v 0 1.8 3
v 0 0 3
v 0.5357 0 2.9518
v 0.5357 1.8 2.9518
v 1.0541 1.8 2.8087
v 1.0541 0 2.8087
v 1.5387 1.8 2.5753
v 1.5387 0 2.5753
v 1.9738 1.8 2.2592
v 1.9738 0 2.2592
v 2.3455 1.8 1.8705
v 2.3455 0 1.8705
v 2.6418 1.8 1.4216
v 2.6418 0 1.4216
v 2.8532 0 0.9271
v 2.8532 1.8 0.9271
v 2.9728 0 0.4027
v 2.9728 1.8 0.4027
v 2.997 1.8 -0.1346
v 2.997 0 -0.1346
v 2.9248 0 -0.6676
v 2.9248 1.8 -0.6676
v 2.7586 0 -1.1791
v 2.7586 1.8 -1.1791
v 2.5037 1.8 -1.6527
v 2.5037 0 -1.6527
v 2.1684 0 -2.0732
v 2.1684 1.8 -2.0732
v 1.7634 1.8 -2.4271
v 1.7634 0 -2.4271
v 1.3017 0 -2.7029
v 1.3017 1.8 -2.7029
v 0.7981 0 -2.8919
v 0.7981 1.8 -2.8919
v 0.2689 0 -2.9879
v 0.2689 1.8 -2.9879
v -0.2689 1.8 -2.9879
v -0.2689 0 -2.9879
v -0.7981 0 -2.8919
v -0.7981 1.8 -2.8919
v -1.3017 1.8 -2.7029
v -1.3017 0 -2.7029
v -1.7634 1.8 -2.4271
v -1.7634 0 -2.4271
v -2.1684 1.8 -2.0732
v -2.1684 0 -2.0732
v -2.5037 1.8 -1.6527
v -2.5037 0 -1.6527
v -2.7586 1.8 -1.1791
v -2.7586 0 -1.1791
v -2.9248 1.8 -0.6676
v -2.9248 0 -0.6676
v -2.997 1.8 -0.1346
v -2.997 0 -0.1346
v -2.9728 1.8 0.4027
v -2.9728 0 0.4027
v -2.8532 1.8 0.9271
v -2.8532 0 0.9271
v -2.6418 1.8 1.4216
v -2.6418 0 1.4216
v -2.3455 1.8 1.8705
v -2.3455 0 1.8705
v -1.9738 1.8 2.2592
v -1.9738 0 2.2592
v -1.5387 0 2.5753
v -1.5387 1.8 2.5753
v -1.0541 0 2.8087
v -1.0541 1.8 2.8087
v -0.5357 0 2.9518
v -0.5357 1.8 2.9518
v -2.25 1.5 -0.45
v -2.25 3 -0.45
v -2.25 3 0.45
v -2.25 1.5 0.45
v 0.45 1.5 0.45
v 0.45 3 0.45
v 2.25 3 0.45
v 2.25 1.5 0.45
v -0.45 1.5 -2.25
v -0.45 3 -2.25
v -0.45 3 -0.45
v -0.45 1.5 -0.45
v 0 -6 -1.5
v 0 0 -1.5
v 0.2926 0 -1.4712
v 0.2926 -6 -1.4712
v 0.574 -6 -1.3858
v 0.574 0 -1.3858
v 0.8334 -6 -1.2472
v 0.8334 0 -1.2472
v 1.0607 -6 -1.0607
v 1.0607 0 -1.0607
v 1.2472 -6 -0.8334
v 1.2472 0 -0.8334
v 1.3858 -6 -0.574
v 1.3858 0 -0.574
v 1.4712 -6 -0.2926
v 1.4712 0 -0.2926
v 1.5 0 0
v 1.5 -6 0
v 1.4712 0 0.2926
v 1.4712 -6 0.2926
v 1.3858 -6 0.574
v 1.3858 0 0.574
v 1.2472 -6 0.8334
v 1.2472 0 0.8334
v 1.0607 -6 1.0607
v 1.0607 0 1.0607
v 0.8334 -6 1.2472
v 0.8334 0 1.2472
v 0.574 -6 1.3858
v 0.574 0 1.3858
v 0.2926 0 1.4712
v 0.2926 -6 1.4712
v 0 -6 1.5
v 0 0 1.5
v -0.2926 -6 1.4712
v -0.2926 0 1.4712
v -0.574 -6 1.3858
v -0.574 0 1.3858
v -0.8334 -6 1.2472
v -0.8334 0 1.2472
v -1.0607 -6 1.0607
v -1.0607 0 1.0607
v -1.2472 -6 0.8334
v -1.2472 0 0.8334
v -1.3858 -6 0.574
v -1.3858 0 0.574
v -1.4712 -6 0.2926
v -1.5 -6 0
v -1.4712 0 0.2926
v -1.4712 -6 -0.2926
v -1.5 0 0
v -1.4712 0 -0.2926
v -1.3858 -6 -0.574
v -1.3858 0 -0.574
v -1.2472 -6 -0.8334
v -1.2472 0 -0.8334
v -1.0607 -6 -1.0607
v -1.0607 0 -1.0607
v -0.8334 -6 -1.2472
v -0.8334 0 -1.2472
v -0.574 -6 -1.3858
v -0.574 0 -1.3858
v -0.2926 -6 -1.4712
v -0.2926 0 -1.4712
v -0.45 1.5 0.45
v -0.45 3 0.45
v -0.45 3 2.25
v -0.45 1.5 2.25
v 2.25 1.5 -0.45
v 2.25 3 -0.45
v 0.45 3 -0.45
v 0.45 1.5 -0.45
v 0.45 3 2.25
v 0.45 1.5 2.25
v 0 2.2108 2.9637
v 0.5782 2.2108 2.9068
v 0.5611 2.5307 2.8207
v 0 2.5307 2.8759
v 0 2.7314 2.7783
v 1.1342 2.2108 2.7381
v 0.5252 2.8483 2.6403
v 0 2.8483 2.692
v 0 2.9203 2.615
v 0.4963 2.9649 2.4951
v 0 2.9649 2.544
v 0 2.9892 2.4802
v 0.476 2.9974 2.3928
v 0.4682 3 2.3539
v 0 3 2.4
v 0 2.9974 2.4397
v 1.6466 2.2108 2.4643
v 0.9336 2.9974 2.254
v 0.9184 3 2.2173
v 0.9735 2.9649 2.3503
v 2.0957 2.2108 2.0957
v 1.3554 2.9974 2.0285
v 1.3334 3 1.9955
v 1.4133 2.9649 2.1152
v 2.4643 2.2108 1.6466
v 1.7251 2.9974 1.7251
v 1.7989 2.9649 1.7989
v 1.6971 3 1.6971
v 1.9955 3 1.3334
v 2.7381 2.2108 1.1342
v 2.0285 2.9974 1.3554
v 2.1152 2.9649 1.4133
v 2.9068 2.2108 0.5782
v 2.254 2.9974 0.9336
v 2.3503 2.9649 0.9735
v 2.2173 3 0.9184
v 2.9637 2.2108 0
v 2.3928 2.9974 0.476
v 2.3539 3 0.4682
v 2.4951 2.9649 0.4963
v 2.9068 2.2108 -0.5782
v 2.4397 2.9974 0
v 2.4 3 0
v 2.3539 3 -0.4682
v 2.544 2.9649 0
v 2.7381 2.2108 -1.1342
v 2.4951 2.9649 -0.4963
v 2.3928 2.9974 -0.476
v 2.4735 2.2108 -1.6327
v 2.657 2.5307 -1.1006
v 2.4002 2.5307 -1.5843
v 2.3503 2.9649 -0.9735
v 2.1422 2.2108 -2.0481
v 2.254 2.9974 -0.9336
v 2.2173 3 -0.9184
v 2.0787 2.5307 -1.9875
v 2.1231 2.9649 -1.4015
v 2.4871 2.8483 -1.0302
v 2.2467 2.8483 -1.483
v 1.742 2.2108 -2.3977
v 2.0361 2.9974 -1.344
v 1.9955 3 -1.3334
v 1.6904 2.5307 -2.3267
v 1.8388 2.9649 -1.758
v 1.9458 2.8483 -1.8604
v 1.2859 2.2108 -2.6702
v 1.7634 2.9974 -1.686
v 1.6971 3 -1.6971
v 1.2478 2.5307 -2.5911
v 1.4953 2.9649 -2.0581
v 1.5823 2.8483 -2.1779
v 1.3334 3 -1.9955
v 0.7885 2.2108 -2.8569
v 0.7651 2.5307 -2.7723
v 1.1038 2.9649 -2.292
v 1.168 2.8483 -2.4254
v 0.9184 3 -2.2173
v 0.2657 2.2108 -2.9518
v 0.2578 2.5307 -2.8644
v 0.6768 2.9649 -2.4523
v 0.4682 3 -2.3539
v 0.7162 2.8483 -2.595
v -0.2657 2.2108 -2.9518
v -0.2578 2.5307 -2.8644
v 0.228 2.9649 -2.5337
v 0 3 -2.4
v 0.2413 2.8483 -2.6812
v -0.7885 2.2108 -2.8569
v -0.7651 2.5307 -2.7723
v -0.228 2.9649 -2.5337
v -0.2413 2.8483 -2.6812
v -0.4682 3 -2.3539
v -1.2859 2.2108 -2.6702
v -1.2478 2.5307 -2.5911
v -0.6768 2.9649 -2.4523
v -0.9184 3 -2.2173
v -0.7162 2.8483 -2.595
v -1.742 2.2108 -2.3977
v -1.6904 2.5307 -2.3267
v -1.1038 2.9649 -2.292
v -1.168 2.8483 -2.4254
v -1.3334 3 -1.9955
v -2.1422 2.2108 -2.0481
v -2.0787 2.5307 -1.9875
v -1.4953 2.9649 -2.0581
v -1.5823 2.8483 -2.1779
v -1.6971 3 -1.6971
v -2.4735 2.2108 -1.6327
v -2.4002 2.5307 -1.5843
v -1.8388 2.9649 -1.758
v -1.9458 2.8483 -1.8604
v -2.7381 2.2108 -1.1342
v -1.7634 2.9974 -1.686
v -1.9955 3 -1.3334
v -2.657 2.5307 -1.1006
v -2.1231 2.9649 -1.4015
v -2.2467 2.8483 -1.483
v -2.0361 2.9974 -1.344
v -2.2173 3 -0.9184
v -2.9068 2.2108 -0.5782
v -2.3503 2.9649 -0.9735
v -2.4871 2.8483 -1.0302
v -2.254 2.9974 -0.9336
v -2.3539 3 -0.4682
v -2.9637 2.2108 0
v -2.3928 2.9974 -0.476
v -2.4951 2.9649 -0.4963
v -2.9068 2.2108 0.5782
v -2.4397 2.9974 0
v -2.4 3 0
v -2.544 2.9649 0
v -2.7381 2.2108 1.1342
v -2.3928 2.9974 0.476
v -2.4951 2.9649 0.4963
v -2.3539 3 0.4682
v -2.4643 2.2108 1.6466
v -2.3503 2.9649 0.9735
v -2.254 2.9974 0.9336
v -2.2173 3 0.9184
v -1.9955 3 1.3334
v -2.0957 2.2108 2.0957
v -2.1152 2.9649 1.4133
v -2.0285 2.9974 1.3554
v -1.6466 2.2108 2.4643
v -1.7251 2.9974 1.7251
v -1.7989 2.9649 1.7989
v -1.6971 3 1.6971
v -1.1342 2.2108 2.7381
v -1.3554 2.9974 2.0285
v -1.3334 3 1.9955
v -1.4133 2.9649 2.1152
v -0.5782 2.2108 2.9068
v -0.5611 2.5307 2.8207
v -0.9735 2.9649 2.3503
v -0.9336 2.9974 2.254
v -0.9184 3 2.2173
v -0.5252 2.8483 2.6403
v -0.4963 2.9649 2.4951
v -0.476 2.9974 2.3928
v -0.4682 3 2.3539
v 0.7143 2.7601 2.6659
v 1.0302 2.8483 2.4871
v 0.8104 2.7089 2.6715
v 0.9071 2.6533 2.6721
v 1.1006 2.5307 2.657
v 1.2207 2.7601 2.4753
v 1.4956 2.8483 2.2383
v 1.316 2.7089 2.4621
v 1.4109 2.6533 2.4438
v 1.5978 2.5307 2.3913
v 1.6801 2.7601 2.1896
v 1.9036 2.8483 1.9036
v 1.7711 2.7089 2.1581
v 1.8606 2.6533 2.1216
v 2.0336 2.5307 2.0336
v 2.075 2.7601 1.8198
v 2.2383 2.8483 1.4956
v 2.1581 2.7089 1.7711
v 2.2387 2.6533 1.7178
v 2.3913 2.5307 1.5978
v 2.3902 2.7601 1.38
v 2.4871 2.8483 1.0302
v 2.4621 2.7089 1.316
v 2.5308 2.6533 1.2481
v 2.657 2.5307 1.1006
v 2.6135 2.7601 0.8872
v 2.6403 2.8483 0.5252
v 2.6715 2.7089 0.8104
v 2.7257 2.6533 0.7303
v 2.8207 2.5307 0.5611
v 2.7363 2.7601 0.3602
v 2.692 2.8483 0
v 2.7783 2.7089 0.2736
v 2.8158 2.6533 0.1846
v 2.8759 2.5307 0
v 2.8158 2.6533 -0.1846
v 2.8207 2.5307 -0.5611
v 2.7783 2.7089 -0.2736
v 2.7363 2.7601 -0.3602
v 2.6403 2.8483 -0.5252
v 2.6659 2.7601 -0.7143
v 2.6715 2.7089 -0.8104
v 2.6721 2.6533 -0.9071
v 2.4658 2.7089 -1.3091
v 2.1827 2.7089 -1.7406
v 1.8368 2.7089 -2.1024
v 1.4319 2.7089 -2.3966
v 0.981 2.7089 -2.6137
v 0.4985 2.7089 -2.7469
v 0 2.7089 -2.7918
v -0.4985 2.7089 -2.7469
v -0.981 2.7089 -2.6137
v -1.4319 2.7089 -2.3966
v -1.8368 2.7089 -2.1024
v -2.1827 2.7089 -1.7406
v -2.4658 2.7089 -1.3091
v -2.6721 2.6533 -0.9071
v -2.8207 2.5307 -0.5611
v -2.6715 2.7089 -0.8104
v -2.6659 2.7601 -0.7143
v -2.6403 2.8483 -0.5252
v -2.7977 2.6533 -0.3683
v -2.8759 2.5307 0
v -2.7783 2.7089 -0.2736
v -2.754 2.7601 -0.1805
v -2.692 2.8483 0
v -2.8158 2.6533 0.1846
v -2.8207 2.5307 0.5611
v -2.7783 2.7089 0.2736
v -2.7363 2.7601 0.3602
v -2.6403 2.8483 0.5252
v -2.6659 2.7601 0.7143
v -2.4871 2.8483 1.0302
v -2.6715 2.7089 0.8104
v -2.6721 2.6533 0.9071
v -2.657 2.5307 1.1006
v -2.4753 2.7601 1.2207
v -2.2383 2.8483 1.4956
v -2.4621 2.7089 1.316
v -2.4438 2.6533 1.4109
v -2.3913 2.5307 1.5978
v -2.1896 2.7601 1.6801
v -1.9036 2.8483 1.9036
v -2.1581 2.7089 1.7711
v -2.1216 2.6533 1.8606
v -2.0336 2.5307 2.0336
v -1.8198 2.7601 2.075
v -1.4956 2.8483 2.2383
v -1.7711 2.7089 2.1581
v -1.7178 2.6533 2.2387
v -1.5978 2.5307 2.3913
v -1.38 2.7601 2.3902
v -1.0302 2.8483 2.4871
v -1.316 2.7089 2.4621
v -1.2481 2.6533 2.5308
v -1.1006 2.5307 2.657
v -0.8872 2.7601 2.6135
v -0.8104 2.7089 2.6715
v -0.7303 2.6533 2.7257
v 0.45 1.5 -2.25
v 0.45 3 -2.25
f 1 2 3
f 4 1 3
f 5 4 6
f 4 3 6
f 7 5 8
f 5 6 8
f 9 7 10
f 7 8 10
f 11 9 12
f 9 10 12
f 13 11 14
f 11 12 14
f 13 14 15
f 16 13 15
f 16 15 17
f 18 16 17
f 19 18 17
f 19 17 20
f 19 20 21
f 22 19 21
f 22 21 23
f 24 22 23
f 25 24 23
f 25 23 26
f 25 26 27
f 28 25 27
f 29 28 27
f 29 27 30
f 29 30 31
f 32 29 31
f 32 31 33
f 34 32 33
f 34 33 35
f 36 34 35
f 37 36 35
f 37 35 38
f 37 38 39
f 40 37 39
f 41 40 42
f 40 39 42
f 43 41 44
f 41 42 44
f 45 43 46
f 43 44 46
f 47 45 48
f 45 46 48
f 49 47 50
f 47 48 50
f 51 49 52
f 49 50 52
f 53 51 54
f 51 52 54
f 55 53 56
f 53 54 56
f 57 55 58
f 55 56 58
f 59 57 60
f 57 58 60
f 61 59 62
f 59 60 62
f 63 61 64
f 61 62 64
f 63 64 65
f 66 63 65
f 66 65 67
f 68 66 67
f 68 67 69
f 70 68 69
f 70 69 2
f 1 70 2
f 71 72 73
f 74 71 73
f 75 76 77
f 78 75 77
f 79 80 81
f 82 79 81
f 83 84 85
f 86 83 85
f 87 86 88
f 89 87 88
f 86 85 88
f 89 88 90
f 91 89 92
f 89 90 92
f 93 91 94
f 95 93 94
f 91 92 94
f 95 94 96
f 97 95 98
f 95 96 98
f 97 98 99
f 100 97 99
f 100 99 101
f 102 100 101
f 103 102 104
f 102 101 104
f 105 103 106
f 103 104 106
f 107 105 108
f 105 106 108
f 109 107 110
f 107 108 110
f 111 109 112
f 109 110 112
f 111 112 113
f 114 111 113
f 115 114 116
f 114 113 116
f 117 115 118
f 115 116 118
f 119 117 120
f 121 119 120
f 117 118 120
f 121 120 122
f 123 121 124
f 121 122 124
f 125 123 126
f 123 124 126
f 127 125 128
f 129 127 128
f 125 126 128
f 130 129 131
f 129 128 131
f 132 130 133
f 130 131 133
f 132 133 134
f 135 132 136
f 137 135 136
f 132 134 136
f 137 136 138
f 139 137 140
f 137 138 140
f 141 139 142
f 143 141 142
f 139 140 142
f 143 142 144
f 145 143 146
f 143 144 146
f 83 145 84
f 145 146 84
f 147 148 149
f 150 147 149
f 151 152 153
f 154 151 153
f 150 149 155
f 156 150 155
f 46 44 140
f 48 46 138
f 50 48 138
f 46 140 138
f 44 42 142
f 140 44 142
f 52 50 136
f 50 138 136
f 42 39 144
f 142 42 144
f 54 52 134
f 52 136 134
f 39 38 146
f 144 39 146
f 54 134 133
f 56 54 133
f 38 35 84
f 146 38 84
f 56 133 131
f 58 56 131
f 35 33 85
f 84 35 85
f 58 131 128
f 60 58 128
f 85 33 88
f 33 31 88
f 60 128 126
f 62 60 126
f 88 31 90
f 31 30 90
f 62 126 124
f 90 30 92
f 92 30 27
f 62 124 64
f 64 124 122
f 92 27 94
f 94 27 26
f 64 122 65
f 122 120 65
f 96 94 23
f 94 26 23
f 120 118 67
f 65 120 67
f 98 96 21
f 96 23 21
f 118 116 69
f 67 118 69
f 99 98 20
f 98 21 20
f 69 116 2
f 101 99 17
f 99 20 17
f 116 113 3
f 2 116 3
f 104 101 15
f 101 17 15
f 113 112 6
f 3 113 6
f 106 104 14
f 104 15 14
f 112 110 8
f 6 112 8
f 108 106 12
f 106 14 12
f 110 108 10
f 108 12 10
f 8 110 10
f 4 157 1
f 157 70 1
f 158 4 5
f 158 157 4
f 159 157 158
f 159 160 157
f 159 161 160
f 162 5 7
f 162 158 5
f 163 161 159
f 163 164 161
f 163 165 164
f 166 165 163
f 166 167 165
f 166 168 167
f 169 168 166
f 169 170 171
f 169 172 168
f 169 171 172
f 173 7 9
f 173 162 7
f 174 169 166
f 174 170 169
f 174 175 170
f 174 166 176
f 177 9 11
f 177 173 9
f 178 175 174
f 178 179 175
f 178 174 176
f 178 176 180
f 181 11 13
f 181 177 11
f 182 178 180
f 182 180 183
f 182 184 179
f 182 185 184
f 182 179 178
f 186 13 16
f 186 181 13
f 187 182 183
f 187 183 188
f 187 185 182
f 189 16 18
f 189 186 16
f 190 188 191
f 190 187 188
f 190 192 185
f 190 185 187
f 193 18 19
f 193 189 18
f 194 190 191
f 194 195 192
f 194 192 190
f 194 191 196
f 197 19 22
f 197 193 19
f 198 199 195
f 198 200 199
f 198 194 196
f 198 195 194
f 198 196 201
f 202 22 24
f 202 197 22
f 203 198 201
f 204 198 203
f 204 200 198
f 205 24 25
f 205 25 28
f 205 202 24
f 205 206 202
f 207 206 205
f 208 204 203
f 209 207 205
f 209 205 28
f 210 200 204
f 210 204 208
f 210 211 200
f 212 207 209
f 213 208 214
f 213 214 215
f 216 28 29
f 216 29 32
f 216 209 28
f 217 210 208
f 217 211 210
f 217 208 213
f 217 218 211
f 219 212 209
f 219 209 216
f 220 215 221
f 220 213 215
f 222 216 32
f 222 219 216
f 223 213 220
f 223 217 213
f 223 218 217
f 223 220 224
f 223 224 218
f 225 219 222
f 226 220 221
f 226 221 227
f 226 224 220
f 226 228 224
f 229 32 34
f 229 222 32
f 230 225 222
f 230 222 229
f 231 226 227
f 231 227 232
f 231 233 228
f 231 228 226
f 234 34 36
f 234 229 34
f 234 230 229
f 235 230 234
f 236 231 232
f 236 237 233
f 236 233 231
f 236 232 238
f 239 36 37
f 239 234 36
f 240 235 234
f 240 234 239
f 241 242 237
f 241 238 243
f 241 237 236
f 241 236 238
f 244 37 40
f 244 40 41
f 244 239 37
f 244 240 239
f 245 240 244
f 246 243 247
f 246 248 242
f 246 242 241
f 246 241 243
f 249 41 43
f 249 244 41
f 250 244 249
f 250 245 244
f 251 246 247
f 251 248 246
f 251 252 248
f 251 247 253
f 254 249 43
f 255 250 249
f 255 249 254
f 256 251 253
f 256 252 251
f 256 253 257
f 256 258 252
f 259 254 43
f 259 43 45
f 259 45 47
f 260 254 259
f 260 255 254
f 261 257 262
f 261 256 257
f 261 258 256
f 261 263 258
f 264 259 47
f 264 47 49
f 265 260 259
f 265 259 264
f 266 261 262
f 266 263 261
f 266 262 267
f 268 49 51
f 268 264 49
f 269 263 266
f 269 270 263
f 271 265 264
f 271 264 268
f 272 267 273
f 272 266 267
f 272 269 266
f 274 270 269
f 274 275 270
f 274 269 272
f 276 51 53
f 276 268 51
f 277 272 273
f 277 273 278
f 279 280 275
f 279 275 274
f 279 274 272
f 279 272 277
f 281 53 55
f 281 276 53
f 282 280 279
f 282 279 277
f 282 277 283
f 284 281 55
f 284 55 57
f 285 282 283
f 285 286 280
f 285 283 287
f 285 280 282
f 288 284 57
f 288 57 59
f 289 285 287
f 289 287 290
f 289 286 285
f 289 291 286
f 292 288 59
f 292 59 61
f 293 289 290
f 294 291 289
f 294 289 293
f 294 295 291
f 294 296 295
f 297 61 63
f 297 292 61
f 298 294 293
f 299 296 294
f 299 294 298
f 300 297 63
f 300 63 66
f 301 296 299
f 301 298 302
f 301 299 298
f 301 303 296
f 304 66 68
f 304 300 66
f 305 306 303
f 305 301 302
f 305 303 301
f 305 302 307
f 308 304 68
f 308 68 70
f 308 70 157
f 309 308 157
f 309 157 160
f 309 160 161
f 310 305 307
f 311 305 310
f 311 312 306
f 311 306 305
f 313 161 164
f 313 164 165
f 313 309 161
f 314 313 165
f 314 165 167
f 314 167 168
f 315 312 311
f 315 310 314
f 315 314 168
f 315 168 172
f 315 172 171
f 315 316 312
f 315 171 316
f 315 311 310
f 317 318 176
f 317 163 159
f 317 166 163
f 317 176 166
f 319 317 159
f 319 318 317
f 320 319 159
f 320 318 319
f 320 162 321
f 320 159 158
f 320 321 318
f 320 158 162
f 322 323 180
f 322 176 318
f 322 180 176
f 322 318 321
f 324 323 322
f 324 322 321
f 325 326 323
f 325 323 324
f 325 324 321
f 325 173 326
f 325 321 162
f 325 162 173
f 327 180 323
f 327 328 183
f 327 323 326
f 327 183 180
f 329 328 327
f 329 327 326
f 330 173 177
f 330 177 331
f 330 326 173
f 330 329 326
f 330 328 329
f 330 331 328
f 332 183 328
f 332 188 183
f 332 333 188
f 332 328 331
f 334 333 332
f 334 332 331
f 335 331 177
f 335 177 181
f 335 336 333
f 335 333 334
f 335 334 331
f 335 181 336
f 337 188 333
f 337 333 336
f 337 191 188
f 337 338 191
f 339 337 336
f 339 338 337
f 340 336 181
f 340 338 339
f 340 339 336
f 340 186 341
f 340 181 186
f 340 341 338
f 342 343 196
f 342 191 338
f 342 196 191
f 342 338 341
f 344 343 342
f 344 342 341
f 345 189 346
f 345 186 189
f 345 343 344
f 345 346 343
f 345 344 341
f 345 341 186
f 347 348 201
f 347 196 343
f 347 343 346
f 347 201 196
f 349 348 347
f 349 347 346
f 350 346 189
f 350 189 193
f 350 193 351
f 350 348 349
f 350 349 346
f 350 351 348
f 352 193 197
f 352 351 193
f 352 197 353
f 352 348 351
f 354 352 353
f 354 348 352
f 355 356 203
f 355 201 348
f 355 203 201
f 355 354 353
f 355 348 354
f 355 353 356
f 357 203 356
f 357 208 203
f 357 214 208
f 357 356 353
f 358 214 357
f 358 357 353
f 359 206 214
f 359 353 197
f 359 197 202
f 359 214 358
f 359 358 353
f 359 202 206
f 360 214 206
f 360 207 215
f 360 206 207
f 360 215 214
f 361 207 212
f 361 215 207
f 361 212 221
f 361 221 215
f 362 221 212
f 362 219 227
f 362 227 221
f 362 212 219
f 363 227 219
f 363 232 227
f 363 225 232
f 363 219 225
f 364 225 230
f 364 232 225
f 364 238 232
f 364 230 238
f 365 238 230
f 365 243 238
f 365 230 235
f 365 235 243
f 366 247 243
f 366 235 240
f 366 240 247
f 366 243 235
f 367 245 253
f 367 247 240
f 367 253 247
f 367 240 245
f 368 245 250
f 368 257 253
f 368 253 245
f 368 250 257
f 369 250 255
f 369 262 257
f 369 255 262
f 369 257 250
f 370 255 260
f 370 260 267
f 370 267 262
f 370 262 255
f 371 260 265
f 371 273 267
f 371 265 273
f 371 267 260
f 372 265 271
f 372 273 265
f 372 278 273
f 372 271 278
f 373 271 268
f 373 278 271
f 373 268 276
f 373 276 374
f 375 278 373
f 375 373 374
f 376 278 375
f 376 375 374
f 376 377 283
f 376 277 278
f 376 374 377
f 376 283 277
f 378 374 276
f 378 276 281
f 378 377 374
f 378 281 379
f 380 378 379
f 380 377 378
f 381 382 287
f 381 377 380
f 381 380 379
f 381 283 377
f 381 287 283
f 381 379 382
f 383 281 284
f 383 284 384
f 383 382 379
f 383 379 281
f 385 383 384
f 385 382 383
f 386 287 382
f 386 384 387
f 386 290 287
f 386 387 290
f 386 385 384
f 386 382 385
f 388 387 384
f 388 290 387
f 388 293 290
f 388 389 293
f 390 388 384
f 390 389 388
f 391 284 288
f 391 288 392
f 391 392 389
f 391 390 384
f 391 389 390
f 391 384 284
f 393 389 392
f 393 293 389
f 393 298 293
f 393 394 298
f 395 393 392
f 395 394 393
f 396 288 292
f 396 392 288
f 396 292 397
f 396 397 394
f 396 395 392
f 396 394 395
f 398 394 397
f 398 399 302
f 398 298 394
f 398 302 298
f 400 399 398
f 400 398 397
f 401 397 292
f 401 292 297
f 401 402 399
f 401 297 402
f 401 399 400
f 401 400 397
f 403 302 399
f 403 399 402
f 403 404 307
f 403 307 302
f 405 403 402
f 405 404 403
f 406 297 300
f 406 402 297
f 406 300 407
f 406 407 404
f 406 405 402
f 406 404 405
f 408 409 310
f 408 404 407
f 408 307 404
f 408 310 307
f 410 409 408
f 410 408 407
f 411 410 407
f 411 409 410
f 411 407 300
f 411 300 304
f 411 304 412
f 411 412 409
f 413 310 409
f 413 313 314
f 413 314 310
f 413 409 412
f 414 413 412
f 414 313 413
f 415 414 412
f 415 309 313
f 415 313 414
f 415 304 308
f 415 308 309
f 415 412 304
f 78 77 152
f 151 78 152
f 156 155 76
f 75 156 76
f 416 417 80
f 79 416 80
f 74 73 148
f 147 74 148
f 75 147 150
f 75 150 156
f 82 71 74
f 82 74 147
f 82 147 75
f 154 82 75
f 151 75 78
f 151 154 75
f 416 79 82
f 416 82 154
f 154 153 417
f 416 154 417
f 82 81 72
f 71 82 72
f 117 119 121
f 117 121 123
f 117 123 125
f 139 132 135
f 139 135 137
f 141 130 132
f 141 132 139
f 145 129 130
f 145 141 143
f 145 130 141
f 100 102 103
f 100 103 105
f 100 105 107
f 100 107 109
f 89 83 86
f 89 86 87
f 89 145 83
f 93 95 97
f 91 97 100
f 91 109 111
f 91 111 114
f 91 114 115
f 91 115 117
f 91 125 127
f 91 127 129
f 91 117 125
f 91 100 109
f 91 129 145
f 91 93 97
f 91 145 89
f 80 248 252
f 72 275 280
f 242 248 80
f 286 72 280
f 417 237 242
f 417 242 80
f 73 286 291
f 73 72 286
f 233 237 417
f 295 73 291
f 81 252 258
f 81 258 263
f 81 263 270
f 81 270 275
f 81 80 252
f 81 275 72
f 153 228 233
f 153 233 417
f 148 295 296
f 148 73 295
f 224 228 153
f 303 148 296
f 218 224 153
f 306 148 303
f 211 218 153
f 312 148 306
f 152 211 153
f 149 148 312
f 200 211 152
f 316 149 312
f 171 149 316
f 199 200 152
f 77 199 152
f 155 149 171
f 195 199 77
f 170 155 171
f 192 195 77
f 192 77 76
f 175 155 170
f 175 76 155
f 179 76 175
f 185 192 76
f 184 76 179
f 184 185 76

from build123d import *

# Parameters (mm, degrees)
SKETCH1_R           = 3
BOSS_EXTRUDE1_DEPTH = 3
SKETCH2_R           = 1.5
BOSS_EXTRUDE2_DEPTH = 6
CUT_EXTRUDE1_DEPTH  = 1.5
FILLET1_SIZE        = 1.2
FILLET1_SIZE_2      = 0.6


with BuildPart() as part:
    # Sketch1 → Boss-Extrude1 (new body)
    with BuildSketch(Plane(origin=(0, 0, 0), x_dir=(1, 0, 0), z_dir=(0, 1, 0))):
        with Locations(Location((0, 0, 0), (0, 0, 270))):
            Circle(SKETCH1_R)
    extrude(amount=BOSS_EXTRUDE1_DEPTH)

    # Sketch2 → Boss-Extrude2 (add)
    with BuildSketch(Plane.XZ):
        with Locations(Location((0, 0, 0), (0, 0, 270))):
            Circle(SKETCH2_R)
    extrude(amount=BOSS_EXTRUDE2_DEPTH)

    # Sketch3 → Cut-Extrude1 (cut)
    with BuildSketch(Plane(origin=(0, 3, 0), x_dir=(1, 0, 0), z_dir=(0, 1, 0))):
        Polygon((-0.45, 2.25), (-0.45, 0.45), (-2.25, 0.45), (-2.25, -0.45), (-0.45, -0.45), (-0.45, -2.25), (0.45, -2.25), (0.45, -0.45), (2.25, -0.45), (2.25, 0.45), (0.45, 0.45), (0.45, 2.25), align=None)
    extrude(amount=-CUT_EXTRUDE1_DEPTH, mode=Mode.SUBTRACT)

    # Fillet1
    # an asymmetric fillet: 1.2, 0.6 mm, written as the material it takes off along each edge
    with BuildSketch(Plane(origin=(0, 3, 0), x_dir=(0, 0, 1), z_dir=(-1, 0, 0))) as fillet1_piece_1:
        with BuildLine():
            Bezier((3, -FILLET1_SIZE), (3, 0), (3 - FILLET1_SIZE_2, 0), weights=[1, 0.707106781, 1])
            Line((3 - FILLET1_SIZE_2, 0), (3, 0))
            Line((3, 0), (3, -FILLET1_SIZE))
        make_face()
    revolve(axis=Axis((0, 3, 0), (0, 1, 0)), mode=Mode.SUBTRACT)


solid = part.part
